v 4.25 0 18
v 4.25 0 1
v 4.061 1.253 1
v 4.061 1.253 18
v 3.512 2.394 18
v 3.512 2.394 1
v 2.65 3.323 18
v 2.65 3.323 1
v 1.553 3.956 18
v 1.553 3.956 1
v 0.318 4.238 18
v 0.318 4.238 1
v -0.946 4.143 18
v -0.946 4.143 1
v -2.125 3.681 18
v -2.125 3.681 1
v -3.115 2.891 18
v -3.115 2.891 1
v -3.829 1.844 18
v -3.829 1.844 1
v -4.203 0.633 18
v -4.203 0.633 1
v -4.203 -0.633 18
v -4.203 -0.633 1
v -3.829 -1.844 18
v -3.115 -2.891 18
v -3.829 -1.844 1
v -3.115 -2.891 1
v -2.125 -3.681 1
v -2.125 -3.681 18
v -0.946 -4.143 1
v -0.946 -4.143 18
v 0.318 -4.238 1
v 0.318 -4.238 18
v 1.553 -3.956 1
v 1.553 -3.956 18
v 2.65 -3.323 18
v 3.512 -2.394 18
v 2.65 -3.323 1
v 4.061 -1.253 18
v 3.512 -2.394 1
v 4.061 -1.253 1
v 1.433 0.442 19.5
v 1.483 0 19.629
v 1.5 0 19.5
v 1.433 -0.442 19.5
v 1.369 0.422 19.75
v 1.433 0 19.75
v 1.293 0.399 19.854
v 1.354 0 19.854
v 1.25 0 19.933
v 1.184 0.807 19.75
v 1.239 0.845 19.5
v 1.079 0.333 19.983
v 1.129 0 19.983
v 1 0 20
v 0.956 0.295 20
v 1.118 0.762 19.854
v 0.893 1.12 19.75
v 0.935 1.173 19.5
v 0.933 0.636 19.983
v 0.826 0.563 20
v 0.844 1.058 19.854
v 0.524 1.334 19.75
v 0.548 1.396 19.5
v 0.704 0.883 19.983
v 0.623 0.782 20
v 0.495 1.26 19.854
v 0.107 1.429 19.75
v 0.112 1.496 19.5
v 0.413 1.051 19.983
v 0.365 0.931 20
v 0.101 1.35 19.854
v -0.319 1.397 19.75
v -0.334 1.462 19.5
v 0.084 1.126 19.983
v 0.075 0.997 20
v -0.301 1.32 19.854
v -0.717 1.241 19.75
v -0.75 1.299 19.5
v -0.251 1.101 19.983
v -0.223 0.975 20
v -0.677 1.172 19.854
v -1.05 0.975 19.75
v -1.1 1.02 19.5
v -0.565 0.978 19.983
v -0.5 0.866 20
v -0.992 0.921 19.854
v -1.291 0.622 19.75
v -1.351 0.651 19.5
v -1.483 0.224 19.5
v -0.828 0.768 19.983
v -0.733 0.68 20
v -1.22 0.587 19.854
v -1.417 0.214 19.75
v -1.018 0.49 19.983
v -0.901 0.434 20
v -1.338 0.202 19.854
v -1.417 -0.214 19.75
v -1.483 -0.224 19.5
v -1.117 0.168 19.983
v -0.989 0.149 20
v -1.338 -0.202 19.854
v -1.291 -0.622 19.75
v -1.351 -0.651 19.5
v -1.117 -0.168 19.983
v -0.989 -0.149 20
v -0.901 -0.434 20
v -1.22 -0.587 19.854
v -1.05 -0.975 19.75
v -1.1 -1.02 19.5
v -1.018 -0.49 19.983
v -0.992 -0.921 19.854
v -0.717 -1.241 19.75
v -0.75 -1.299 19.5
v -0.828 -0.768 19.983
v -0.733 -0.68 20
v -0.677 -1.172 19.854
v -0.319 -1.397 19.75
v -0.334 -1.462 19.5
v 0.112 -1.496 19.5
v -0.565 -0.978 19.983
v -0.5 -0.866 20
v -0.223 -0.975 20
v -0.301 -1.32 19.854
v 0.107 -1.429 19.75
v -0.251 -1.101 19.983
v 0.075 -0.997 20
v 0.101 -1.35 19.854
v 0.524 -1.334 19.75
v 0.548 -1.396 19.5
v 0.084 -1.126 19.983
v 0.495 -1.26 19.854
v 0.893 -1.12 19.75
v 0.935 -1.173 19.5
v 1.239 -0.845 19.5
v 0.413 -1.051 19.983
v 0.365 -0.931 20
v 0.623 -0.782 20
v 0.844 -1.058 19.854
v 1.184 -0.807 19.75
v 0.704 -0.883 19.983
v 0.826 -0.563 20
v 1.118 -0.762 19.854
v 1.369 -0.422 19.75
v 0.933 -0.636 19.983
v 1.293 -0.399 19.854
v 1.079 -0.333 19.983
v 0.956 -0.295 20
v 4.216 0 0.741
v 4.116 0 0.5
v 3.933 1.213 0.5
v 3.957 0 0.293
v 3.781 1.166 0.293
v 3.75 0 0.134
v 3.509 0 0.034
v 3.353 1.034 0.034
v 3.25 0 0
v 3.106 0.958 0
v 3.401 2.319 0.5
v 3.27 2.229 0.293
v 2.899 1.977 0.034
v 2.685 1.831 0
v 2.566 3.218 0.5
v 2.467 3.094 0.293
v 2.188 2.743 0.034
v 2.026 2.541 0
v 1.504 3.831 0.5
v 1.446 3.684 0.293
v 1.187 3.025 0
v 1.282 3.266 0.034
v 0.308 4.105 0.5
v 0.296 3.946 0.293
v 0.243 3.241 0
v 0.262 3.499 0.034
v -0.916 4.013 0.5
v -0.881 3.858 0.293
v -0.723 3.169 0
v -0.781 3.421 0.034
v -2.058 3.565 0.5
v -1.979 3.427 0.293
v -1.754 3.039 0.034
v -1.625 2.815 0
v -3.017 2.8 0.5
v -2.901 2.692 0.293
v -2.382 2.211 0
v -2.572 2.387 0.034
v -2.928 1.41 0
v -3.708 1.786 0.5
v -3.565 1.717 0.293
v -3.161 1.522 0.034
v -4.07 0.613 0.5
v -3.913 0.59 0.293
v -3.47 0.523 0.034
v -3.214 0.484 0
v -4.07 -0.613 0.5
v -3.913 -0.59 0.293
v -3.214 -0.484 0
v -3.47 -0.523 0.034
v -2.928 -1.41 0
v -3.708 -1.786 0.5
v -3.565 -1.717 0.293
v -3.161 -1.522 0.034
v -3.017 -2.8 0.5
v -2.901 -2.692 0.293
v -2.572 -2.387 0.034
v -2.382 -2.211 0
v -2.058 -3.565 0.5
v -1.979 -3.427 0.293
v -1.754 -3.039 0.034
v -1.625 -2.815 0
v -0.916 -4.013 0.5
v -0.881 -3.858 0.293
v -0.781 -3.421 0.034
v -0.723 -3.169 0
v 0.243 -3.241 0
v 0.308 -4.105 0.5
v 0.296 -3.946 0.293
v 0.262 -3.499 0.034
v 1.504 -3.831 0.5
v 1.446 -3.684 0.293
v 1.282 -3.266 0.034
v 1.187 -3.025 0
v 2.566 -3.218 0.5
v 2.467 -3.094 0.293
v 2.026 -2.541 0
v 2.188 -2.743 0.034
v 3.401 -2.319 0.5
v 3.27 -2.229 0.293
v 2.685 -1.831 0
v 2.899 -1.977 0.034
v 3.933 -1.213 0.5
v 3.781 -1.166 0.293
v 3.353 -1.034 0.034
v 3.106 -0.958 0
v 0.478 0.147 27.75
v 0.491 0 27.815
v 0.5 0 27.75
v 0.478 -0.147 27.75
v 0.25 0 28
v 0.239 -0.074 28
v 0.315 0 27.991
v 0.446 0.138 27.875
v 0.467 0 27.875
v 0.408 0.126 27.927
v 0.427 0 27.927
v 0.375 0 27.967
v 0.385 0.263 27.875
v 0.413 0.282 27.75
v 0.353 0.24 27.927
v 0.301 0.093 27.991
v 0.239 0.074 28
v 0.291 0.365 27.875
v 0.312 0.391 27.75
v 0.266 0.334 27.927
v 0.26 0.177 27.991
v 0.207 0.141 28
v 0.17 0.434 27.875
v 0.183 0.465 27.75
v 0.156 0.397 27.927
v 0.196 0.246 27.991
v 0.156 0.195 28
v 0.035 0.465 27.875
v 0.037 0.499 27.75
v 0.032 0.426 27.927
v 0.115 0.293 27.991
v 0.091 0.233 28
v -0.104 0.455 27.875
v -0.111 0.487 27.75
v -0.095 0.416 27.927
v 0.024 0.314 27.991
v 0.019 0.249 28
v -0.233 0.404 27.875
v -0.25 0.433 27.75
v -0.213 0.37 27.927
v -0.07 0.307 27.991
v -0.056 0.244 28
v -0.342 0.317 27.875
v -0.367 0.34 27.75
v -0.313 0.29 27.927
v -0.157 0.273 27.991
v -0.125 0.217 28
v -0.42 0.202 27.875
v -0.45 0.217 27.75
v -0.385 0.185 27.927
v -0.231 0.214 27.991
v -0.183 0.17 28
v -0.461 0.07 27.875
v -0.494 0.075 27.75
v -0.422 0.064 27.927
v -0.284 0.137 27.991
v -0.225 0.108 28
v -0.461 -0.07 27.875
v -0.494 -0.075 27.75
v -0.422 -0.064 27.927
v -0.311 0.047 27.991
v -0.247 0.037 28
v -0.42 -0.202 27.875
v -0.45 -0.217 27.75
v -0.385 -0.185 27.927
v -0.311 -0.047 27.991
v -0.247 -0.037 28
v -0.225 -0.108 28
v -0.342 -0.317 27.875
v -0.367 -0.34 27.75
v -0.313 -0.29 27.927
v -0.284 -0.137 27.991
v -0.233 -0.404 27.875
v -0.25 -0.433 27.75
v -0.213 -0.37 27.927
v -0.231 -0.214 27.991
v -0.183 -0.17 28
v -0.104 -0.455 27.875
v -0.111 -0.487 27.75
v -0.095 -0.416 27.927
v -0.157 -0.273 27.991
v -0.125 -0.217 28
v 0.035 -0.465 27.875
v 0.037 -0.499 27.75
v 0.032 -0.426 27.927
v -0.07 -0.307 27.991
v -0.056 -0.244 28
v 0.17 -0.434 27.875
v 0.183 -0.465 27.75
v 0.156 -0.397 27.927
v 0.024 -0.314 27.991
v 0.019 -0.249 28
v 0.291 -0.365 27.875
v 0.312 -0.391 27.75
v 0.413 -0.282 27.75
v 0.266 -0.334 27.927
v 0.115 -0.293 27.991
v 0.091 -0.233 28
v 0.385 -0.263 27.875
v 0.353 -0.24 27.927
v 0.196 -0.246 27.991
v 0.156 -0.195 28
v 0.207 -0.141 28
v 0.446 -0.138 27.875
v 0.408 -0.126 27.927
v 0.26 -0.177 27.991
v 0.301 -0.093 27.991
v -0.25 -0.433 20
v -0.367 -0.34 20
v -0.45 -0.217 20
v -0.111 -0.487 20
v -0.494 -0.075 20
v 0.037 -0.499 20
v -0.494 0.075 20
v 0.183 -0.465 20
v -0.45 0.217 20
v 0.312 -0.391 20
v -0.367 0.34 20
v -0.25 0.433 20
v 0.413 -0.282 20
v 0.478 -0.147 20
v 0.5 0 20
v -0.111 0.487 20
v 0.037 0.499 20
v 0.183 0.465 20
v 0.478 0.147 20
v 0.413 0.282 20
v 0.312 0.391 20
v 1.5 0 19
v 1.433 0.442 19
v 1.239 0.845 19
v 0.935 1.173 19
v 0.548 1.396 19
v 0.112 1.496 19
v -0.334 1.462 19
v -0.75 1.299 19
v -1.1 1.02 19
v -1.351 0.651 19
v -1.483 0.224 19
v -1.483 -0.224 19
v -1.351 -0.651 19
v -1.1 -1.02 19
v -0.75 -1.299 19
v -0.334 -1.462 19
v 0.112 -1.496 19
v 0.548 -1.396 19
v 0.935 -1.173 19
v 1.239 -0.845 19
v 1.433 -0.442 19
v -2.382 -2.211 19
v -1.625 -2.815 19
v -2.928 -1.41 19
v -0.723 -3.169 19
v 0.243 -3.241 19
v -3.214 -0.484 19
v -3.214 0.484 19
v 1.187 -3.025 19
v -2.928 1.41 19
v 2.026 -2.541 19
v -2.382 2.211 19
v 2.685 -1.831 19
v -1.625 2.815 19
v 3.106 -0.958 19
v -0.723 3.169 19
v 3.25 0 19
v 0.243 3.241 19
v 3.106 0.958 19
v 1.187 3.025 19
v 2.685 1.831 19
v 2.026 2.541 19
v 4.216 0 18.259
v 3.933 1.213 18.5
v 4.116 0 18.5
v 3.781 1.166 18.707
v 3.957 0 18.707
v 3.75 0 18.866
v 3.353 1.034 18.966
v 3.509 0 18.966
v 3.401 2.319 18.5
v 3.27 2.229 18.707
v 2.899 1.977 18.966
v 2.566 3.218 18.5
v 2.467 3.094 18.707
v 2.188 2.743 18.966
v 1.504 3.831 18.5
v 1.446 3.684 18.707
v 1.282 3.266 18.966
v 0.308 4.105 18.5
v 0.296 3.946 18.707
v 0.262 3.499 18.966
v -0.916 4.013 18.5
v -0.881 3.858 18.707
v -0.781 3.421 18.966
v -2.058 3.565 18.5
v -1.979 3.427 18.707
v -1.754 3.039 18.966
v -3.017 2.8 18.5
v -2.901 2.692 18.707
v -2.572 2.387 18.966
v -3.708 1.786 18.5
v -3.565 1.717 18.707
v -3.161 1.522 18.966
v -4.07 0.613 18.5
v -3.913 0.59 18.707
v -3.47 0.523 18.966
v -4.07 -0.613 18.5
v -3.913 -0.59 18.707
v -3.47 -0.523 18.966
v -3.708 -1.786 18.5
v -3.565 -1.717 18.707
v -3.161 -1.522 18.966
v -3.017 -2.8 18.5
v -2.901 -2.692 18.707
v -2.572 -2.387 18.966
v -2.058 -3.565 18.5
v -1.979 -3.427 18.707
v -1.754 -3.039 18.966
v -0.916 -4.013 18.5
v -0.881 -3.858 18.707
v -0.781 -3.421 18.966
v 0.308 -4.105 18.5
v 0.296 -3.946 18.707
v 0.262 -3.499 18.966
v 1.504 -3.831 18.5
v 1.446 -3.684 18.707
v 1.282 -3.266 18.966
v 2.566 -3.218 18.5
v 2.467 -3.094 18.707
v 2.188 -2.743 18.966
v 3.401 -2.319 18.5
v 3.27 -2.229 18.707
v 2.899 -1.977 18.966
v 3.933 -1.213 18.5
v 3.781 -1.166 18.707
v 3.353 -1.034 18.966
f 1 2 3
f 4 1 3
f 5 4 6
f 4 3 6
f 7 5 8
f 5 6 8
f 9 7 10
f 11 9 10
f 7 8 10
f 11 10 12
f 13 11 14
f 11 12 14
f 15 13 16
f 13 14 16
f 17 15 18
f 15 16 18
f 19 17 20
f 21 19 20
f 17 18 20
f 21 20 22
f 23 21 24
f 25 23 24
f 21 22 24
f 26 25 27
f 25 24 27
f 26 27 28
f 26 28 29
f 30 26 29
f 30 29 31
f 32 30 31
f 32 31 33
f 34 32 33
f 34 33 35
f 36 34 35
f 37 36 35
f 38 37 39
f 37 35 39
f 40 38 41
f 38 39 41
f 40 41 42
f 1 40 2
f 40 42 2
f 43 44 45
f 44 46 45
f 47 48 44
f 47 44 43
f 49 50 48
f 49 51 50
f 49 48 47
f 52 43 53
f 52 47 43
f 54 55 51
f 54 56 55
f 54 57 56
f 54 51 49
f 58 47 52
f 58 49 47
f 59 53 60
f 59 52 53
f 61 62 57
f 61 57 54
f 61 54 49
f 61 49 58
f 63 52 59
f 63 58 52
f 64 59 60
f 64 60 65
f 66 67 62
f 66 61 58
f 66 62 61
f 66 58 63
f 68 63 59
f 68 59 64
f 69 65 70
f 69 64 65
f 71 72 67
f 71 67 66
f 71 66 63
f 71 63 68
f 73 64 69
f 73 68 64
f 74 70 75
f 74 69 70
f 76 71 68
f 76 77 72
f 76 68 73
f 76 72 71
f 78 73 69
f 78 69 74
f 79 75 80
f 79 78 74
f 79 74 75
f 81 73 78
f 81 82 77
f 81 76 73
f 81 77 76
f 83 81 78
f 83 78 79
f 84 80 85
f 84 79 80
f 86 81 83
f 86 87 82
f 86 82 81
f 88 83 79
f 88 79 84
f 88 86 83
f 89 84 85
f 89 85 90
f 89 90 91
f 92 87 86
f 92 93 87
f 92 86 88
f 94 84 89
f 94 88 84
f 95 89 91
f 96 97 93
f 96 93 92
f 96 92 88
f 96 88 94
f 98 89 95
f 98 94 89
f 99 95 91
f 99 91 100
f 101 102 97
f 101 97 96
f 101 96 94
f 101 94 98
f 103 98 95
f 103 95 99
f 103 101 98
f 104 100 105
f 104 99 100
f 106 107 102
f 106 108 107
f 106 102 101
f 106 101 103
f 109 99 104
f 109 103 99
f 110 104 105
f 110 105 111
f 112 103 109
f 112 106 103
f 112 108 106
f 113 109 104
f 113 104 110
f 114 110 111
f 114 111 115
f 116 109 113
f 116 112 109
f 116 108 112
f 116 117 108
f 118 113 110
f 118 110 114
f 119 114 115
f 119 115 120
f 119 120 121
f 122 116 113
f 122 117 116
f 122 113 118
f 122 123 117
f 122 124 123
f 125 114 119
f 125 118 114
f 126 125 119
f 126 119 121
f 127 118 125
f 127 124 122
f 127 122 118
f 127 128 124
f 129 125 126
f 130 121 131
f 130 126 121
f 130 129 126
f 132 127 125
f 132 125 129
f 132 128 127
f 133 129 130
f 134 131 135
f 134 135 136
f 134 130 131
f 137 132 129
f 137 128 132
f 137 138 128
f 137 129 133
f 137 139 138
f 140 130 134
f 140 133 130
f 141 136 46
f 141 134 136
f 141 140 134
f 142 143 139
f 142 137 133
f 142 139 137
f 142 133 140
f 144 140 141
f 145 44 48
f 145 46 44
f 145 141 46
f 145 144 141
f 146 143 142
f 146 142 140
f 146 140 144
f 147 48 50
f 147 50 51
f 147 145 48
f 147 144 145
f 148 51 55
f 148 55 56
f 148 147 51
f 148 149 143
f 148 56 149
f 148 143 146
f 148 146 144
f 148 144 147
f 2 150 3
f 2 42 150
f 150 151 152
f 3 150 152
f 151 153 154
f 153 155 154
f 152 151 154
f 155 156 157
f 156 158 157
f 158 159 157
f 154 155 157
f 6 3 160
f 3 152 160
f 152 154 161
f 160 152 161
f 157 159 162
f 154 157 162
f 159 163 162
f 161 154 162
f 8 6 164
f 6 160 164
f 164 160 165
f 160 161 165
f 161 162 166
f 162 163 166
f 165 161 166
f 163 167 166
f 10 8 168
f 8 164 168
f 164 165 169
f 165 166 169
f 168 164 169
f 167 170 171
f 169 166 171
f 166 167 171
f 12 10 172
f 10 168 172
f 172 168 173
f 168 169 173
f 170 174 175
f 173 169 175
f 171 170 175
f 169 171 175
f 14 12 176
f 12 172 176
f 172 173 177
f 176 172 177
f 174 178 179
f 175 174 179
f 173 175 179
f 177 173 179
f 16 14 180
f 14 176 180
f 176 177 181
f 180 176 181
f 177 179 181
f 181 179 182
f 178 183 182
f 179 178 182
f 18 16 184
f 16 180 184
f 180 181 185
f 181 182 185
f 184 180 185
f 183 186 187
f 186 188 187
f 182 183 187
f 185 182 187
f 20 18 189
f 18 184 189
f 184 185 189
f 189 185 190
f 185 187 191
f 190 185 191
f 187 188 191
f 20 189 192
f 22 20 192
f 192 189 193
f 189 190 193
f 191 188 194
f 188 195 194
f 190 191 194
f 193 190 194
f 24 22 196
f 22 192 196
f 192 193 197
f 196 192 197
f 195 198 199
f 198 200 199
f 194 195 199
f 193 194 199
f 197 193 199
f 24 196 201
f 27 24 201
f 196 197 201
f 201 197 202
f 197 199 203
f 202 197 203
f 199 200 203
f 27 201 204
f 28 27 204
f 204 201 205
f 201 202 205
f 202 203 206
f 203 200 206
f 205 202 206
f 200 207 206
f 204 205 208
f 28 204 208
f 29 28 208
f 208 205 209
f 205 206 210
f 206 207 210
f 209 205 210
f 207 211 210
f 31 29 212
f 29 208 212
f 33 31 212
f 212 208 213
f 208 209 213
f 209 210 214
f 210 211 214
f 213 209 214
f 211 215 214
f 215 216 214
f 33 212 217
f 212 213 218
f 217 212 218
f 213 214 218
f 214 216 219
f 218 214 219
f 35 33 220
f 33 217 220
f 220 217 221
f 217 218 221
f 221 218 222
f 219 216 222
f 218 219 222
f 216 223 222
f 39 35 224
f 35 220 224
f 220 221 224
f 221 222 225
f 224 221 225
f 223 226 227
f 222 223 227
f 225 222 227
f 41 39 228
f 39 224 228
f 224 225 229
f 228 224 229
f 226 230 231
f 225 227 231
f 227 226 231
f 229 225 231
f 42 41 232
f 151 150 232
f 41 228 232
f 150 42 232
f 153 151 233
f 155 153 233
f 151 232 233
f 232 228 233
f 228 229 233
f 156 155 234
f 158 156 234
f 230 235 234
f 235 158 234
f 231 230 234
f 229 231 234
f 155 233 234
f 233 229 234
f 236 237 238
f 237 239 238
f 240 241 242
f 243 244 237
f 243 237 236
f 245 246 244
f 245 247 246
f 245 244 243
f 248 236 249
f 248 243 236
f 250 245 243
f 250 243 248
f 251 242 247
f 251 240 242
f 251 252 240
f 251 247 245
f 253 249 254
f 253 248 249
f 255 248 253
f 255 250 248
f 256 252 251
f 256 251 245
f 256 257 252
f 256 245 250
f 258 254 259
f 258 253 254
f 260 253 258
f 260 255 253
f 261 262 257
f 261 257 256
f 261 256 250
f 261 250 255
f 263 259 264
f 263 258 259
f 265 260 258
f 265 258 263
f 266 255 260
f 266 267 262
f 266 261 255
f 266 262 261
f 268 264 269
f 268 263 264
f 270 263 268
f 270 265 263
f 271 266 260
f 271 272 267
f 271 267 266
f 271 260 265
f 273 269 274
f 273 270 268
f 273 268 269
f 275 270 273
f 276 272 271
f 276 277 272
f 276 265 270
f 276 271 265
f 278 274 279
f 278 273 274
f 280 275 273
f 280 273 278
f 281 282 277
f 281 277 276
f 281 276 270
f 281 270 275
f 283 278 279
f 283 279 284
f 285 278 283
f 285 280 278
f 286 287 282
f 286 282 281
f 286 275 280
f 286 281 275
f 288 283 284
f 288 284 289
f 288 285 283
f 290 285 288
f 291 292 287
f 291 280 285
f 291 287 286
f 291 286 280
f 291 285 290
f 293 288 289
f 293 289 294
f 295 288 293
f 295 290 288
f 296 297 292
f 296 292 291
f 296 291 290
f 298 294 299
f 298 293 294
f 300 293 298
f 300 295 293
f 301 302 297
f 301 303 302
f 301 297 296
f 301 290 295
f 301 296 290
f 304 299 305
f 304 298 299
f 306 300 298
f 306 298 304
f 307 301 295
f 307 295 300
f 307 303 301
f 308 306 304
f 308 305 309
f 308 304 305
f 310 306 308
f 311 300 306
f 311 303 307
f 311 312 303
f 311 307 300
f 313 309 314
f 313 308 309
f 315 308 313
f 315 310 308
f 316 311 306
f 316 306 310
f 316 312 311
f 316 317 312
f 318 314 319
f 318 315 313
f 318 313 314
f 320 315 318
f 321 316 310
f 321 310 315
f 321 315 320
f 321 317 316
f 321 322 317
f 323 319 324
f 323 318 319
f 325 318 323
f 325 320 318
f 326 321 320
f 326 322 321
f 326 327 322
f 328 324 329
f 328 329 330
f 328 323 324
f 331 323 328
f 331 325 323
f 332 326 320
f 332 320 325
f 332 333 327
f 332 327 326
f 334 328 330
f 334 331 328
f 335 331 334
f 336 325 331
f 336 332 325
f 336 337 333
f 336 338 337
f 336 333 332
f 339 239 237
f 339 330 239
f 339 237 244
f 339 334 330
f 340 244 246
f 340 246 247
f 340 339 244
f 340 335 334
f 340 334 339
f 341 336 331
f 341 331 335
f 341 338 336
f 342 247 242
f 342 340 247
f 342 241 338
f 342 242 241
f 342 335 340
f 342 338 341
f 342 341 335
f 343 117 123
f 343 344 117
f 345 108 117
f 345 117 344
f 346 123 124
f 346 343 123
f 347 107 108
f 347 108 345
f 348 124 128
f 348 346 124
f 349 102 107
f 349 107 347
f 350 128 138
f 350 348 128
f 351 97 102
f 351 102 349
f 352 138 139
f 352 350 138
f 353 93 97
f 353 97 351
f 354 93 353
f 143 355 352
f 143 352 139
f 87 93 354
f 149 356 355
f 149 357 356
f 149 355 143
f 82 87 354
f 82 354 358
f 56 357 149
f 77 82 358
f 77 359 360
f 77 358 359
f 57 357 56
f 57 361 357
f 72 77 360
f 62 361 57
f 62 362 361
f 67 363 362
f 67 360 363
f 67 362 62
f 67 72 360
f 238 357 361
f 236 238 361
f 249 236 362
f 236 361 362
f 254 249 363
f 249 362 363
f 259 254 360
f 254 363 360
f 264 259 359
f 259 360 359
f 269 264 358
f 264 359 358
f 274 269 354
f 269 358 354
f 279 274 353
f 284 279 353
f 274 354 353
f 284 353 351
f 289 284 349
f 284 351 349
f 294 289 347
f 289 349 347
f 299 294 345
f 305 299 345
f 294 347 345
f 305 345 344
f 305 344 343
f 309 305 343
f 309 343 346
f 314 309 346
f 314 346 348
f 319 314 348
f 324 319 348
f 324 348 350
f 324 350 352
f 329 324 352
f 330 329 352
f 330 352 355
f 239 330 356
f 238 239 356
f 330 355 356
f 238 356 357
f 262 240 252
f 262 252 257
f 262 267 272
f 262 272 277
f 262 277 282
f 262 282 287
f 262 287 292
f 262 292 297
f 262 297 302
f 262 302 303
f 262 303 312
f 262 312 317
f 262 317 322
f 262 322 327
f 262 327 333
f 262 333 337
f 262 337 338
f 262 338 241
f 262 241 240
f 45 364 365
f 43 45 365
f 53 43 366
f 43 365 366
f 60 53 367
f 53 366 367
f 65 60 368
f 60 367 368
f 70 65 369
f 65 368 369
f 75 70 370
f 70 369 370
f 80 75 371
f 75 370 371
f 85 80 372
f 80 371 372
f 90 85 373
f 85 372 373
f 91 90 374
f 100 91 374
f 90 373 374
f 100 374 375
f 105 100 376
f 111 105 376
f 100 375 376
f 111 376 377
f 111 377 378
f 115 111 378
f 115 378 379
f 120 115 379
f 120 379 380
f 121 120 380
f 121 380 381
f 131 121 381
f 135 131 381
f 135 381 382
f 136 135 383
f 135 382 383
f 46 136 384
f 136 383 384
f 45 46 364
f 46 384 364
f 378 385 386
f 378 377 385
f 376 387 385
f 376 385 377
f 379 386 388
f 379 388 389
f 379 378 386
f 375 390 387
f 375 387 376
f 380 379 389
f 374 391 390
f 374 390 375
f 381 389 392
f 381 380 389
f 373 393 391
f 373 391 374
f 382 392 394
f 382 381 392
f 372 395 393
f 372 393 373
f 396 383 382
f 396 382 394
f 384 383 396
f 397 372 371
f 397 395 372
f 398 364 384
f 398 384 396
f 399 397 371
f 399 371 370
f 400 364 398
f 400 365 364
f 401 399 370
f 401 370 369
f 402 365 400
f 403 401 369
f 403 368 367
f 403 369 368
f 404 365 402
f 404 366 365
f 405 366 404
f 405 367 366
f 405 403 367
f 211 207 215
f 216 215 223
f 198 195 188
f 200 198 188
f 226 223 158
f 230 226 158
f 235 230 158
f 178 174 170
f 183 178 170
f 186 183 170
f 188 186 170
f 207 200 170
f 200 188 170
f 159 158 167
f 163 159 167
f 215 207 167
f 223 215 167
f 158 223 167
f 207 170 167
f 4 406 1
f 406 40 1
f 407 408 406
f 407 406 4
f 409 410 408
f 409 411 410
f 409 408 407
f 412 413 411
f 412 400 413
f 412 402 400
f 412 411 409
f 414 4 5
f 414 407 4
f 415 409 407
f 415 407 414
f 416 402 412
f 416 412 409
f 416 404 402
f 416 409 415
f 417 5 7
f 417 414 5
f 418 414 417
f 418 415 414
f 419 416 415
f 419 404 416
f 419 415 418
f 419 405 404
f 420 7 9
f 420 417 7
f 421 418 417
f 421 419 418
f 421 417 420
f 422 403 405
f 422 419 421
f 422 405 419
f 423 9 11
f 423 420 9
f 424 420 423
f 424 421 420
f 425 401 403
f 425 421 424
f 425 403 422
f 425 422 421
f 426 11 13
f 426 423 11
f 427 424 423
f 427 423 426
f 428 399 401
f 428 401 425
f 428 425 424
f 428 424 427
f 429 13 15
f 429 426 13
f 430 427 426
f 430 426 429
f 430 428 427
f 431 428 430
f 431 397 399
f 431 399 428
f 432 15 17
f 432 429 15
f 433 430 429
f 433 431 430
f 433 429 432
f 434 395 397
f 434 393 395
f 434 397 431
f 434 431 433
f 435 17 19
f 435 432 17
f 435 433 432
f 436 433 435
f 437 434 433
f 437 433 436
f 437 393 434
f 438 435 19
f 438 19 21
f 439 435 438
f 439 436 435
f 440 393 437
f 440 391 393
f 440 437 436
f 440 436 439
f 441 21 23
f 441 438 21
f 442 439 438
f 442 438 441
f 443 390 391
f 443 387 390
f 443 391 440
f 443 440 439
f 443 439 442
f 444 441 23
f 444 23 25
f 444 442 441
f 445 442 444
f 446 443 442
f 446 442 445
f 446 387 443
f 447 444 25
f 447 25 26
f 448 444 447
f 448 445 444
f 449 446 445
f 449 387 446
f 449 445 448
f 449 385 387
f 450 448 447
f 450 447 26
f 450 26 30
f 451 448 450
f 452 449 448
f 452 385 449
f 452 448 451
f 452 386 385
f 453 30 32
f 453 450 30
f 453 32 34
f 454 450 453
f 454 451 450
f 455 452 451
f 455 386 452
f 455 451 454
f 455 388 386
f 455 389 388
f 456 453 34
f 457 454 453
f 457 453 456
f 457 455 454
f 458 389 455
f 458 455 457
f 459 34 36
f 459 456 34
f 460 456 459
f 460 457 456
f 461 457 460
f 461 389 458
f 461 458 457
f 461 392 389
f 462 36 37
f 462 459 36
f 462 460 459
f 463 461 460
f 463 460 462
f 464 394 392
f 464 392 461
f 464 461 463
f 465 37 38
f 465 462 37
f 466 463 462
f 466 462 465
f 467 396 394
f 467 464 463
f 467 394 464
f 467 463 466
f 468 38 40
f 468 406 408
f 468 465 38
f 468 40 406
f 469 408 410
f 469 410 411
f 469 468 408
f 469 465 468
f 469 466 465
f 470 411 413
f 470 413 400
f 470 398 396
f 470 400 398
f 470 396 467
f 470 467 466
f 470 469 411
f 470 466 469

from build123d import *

# Parameters (mm, degrees)
F0_R     = 4.25
F1_DEPTH = 19
F2_R     = 1
F3_R     = 1.5
F4_DEPTH = 1
F5_R     = 0.5
F7_R     = 0.5
F8_DEPTH = 8
F9_R     = 0.25


with BuildPart() as f1:
    # F0 (on Top) → F1 (new body)
    with BuildSketch(Plane.XY):
        Circle(F0_R)
    extrude(amount=F1_DEPTH)

    # F2
    f2_edges = [f1.edges().sort_by_distance(p)[0] for p in [
        (-4.25, 0, 19),
        (-4.25, 0, 0),
    ]]
    fillet(f2_edges, radius=F2_R)

    # F3 (on face) → F4 (join)
    with BuildSketch(Plane.XY.offset(19)):
        Circle(F3_R)
    extrude(amount=F4_DEPTH)

    # F5
    f5_edges = [f1.edges().sort_by_distance(p)[0] for p in [
        (-1.5, 0, 20),
    ]]
    fillet(f5_edges, radius=F5_R)

    # F7 (on face) → F8 (join)
    with BuildSketch(Plane.XY.offset(20)):
        Circle(F7_R)
    extrude(amount=F8_DEPTH)

    # F9
    f9_edges = [f1.edges().sort_by_distance(p)[0] for p in [
        (-0.5, 0, 28),
    ]]
    fillet(f9_edges, radius=F9_R)


solid = f1.part
